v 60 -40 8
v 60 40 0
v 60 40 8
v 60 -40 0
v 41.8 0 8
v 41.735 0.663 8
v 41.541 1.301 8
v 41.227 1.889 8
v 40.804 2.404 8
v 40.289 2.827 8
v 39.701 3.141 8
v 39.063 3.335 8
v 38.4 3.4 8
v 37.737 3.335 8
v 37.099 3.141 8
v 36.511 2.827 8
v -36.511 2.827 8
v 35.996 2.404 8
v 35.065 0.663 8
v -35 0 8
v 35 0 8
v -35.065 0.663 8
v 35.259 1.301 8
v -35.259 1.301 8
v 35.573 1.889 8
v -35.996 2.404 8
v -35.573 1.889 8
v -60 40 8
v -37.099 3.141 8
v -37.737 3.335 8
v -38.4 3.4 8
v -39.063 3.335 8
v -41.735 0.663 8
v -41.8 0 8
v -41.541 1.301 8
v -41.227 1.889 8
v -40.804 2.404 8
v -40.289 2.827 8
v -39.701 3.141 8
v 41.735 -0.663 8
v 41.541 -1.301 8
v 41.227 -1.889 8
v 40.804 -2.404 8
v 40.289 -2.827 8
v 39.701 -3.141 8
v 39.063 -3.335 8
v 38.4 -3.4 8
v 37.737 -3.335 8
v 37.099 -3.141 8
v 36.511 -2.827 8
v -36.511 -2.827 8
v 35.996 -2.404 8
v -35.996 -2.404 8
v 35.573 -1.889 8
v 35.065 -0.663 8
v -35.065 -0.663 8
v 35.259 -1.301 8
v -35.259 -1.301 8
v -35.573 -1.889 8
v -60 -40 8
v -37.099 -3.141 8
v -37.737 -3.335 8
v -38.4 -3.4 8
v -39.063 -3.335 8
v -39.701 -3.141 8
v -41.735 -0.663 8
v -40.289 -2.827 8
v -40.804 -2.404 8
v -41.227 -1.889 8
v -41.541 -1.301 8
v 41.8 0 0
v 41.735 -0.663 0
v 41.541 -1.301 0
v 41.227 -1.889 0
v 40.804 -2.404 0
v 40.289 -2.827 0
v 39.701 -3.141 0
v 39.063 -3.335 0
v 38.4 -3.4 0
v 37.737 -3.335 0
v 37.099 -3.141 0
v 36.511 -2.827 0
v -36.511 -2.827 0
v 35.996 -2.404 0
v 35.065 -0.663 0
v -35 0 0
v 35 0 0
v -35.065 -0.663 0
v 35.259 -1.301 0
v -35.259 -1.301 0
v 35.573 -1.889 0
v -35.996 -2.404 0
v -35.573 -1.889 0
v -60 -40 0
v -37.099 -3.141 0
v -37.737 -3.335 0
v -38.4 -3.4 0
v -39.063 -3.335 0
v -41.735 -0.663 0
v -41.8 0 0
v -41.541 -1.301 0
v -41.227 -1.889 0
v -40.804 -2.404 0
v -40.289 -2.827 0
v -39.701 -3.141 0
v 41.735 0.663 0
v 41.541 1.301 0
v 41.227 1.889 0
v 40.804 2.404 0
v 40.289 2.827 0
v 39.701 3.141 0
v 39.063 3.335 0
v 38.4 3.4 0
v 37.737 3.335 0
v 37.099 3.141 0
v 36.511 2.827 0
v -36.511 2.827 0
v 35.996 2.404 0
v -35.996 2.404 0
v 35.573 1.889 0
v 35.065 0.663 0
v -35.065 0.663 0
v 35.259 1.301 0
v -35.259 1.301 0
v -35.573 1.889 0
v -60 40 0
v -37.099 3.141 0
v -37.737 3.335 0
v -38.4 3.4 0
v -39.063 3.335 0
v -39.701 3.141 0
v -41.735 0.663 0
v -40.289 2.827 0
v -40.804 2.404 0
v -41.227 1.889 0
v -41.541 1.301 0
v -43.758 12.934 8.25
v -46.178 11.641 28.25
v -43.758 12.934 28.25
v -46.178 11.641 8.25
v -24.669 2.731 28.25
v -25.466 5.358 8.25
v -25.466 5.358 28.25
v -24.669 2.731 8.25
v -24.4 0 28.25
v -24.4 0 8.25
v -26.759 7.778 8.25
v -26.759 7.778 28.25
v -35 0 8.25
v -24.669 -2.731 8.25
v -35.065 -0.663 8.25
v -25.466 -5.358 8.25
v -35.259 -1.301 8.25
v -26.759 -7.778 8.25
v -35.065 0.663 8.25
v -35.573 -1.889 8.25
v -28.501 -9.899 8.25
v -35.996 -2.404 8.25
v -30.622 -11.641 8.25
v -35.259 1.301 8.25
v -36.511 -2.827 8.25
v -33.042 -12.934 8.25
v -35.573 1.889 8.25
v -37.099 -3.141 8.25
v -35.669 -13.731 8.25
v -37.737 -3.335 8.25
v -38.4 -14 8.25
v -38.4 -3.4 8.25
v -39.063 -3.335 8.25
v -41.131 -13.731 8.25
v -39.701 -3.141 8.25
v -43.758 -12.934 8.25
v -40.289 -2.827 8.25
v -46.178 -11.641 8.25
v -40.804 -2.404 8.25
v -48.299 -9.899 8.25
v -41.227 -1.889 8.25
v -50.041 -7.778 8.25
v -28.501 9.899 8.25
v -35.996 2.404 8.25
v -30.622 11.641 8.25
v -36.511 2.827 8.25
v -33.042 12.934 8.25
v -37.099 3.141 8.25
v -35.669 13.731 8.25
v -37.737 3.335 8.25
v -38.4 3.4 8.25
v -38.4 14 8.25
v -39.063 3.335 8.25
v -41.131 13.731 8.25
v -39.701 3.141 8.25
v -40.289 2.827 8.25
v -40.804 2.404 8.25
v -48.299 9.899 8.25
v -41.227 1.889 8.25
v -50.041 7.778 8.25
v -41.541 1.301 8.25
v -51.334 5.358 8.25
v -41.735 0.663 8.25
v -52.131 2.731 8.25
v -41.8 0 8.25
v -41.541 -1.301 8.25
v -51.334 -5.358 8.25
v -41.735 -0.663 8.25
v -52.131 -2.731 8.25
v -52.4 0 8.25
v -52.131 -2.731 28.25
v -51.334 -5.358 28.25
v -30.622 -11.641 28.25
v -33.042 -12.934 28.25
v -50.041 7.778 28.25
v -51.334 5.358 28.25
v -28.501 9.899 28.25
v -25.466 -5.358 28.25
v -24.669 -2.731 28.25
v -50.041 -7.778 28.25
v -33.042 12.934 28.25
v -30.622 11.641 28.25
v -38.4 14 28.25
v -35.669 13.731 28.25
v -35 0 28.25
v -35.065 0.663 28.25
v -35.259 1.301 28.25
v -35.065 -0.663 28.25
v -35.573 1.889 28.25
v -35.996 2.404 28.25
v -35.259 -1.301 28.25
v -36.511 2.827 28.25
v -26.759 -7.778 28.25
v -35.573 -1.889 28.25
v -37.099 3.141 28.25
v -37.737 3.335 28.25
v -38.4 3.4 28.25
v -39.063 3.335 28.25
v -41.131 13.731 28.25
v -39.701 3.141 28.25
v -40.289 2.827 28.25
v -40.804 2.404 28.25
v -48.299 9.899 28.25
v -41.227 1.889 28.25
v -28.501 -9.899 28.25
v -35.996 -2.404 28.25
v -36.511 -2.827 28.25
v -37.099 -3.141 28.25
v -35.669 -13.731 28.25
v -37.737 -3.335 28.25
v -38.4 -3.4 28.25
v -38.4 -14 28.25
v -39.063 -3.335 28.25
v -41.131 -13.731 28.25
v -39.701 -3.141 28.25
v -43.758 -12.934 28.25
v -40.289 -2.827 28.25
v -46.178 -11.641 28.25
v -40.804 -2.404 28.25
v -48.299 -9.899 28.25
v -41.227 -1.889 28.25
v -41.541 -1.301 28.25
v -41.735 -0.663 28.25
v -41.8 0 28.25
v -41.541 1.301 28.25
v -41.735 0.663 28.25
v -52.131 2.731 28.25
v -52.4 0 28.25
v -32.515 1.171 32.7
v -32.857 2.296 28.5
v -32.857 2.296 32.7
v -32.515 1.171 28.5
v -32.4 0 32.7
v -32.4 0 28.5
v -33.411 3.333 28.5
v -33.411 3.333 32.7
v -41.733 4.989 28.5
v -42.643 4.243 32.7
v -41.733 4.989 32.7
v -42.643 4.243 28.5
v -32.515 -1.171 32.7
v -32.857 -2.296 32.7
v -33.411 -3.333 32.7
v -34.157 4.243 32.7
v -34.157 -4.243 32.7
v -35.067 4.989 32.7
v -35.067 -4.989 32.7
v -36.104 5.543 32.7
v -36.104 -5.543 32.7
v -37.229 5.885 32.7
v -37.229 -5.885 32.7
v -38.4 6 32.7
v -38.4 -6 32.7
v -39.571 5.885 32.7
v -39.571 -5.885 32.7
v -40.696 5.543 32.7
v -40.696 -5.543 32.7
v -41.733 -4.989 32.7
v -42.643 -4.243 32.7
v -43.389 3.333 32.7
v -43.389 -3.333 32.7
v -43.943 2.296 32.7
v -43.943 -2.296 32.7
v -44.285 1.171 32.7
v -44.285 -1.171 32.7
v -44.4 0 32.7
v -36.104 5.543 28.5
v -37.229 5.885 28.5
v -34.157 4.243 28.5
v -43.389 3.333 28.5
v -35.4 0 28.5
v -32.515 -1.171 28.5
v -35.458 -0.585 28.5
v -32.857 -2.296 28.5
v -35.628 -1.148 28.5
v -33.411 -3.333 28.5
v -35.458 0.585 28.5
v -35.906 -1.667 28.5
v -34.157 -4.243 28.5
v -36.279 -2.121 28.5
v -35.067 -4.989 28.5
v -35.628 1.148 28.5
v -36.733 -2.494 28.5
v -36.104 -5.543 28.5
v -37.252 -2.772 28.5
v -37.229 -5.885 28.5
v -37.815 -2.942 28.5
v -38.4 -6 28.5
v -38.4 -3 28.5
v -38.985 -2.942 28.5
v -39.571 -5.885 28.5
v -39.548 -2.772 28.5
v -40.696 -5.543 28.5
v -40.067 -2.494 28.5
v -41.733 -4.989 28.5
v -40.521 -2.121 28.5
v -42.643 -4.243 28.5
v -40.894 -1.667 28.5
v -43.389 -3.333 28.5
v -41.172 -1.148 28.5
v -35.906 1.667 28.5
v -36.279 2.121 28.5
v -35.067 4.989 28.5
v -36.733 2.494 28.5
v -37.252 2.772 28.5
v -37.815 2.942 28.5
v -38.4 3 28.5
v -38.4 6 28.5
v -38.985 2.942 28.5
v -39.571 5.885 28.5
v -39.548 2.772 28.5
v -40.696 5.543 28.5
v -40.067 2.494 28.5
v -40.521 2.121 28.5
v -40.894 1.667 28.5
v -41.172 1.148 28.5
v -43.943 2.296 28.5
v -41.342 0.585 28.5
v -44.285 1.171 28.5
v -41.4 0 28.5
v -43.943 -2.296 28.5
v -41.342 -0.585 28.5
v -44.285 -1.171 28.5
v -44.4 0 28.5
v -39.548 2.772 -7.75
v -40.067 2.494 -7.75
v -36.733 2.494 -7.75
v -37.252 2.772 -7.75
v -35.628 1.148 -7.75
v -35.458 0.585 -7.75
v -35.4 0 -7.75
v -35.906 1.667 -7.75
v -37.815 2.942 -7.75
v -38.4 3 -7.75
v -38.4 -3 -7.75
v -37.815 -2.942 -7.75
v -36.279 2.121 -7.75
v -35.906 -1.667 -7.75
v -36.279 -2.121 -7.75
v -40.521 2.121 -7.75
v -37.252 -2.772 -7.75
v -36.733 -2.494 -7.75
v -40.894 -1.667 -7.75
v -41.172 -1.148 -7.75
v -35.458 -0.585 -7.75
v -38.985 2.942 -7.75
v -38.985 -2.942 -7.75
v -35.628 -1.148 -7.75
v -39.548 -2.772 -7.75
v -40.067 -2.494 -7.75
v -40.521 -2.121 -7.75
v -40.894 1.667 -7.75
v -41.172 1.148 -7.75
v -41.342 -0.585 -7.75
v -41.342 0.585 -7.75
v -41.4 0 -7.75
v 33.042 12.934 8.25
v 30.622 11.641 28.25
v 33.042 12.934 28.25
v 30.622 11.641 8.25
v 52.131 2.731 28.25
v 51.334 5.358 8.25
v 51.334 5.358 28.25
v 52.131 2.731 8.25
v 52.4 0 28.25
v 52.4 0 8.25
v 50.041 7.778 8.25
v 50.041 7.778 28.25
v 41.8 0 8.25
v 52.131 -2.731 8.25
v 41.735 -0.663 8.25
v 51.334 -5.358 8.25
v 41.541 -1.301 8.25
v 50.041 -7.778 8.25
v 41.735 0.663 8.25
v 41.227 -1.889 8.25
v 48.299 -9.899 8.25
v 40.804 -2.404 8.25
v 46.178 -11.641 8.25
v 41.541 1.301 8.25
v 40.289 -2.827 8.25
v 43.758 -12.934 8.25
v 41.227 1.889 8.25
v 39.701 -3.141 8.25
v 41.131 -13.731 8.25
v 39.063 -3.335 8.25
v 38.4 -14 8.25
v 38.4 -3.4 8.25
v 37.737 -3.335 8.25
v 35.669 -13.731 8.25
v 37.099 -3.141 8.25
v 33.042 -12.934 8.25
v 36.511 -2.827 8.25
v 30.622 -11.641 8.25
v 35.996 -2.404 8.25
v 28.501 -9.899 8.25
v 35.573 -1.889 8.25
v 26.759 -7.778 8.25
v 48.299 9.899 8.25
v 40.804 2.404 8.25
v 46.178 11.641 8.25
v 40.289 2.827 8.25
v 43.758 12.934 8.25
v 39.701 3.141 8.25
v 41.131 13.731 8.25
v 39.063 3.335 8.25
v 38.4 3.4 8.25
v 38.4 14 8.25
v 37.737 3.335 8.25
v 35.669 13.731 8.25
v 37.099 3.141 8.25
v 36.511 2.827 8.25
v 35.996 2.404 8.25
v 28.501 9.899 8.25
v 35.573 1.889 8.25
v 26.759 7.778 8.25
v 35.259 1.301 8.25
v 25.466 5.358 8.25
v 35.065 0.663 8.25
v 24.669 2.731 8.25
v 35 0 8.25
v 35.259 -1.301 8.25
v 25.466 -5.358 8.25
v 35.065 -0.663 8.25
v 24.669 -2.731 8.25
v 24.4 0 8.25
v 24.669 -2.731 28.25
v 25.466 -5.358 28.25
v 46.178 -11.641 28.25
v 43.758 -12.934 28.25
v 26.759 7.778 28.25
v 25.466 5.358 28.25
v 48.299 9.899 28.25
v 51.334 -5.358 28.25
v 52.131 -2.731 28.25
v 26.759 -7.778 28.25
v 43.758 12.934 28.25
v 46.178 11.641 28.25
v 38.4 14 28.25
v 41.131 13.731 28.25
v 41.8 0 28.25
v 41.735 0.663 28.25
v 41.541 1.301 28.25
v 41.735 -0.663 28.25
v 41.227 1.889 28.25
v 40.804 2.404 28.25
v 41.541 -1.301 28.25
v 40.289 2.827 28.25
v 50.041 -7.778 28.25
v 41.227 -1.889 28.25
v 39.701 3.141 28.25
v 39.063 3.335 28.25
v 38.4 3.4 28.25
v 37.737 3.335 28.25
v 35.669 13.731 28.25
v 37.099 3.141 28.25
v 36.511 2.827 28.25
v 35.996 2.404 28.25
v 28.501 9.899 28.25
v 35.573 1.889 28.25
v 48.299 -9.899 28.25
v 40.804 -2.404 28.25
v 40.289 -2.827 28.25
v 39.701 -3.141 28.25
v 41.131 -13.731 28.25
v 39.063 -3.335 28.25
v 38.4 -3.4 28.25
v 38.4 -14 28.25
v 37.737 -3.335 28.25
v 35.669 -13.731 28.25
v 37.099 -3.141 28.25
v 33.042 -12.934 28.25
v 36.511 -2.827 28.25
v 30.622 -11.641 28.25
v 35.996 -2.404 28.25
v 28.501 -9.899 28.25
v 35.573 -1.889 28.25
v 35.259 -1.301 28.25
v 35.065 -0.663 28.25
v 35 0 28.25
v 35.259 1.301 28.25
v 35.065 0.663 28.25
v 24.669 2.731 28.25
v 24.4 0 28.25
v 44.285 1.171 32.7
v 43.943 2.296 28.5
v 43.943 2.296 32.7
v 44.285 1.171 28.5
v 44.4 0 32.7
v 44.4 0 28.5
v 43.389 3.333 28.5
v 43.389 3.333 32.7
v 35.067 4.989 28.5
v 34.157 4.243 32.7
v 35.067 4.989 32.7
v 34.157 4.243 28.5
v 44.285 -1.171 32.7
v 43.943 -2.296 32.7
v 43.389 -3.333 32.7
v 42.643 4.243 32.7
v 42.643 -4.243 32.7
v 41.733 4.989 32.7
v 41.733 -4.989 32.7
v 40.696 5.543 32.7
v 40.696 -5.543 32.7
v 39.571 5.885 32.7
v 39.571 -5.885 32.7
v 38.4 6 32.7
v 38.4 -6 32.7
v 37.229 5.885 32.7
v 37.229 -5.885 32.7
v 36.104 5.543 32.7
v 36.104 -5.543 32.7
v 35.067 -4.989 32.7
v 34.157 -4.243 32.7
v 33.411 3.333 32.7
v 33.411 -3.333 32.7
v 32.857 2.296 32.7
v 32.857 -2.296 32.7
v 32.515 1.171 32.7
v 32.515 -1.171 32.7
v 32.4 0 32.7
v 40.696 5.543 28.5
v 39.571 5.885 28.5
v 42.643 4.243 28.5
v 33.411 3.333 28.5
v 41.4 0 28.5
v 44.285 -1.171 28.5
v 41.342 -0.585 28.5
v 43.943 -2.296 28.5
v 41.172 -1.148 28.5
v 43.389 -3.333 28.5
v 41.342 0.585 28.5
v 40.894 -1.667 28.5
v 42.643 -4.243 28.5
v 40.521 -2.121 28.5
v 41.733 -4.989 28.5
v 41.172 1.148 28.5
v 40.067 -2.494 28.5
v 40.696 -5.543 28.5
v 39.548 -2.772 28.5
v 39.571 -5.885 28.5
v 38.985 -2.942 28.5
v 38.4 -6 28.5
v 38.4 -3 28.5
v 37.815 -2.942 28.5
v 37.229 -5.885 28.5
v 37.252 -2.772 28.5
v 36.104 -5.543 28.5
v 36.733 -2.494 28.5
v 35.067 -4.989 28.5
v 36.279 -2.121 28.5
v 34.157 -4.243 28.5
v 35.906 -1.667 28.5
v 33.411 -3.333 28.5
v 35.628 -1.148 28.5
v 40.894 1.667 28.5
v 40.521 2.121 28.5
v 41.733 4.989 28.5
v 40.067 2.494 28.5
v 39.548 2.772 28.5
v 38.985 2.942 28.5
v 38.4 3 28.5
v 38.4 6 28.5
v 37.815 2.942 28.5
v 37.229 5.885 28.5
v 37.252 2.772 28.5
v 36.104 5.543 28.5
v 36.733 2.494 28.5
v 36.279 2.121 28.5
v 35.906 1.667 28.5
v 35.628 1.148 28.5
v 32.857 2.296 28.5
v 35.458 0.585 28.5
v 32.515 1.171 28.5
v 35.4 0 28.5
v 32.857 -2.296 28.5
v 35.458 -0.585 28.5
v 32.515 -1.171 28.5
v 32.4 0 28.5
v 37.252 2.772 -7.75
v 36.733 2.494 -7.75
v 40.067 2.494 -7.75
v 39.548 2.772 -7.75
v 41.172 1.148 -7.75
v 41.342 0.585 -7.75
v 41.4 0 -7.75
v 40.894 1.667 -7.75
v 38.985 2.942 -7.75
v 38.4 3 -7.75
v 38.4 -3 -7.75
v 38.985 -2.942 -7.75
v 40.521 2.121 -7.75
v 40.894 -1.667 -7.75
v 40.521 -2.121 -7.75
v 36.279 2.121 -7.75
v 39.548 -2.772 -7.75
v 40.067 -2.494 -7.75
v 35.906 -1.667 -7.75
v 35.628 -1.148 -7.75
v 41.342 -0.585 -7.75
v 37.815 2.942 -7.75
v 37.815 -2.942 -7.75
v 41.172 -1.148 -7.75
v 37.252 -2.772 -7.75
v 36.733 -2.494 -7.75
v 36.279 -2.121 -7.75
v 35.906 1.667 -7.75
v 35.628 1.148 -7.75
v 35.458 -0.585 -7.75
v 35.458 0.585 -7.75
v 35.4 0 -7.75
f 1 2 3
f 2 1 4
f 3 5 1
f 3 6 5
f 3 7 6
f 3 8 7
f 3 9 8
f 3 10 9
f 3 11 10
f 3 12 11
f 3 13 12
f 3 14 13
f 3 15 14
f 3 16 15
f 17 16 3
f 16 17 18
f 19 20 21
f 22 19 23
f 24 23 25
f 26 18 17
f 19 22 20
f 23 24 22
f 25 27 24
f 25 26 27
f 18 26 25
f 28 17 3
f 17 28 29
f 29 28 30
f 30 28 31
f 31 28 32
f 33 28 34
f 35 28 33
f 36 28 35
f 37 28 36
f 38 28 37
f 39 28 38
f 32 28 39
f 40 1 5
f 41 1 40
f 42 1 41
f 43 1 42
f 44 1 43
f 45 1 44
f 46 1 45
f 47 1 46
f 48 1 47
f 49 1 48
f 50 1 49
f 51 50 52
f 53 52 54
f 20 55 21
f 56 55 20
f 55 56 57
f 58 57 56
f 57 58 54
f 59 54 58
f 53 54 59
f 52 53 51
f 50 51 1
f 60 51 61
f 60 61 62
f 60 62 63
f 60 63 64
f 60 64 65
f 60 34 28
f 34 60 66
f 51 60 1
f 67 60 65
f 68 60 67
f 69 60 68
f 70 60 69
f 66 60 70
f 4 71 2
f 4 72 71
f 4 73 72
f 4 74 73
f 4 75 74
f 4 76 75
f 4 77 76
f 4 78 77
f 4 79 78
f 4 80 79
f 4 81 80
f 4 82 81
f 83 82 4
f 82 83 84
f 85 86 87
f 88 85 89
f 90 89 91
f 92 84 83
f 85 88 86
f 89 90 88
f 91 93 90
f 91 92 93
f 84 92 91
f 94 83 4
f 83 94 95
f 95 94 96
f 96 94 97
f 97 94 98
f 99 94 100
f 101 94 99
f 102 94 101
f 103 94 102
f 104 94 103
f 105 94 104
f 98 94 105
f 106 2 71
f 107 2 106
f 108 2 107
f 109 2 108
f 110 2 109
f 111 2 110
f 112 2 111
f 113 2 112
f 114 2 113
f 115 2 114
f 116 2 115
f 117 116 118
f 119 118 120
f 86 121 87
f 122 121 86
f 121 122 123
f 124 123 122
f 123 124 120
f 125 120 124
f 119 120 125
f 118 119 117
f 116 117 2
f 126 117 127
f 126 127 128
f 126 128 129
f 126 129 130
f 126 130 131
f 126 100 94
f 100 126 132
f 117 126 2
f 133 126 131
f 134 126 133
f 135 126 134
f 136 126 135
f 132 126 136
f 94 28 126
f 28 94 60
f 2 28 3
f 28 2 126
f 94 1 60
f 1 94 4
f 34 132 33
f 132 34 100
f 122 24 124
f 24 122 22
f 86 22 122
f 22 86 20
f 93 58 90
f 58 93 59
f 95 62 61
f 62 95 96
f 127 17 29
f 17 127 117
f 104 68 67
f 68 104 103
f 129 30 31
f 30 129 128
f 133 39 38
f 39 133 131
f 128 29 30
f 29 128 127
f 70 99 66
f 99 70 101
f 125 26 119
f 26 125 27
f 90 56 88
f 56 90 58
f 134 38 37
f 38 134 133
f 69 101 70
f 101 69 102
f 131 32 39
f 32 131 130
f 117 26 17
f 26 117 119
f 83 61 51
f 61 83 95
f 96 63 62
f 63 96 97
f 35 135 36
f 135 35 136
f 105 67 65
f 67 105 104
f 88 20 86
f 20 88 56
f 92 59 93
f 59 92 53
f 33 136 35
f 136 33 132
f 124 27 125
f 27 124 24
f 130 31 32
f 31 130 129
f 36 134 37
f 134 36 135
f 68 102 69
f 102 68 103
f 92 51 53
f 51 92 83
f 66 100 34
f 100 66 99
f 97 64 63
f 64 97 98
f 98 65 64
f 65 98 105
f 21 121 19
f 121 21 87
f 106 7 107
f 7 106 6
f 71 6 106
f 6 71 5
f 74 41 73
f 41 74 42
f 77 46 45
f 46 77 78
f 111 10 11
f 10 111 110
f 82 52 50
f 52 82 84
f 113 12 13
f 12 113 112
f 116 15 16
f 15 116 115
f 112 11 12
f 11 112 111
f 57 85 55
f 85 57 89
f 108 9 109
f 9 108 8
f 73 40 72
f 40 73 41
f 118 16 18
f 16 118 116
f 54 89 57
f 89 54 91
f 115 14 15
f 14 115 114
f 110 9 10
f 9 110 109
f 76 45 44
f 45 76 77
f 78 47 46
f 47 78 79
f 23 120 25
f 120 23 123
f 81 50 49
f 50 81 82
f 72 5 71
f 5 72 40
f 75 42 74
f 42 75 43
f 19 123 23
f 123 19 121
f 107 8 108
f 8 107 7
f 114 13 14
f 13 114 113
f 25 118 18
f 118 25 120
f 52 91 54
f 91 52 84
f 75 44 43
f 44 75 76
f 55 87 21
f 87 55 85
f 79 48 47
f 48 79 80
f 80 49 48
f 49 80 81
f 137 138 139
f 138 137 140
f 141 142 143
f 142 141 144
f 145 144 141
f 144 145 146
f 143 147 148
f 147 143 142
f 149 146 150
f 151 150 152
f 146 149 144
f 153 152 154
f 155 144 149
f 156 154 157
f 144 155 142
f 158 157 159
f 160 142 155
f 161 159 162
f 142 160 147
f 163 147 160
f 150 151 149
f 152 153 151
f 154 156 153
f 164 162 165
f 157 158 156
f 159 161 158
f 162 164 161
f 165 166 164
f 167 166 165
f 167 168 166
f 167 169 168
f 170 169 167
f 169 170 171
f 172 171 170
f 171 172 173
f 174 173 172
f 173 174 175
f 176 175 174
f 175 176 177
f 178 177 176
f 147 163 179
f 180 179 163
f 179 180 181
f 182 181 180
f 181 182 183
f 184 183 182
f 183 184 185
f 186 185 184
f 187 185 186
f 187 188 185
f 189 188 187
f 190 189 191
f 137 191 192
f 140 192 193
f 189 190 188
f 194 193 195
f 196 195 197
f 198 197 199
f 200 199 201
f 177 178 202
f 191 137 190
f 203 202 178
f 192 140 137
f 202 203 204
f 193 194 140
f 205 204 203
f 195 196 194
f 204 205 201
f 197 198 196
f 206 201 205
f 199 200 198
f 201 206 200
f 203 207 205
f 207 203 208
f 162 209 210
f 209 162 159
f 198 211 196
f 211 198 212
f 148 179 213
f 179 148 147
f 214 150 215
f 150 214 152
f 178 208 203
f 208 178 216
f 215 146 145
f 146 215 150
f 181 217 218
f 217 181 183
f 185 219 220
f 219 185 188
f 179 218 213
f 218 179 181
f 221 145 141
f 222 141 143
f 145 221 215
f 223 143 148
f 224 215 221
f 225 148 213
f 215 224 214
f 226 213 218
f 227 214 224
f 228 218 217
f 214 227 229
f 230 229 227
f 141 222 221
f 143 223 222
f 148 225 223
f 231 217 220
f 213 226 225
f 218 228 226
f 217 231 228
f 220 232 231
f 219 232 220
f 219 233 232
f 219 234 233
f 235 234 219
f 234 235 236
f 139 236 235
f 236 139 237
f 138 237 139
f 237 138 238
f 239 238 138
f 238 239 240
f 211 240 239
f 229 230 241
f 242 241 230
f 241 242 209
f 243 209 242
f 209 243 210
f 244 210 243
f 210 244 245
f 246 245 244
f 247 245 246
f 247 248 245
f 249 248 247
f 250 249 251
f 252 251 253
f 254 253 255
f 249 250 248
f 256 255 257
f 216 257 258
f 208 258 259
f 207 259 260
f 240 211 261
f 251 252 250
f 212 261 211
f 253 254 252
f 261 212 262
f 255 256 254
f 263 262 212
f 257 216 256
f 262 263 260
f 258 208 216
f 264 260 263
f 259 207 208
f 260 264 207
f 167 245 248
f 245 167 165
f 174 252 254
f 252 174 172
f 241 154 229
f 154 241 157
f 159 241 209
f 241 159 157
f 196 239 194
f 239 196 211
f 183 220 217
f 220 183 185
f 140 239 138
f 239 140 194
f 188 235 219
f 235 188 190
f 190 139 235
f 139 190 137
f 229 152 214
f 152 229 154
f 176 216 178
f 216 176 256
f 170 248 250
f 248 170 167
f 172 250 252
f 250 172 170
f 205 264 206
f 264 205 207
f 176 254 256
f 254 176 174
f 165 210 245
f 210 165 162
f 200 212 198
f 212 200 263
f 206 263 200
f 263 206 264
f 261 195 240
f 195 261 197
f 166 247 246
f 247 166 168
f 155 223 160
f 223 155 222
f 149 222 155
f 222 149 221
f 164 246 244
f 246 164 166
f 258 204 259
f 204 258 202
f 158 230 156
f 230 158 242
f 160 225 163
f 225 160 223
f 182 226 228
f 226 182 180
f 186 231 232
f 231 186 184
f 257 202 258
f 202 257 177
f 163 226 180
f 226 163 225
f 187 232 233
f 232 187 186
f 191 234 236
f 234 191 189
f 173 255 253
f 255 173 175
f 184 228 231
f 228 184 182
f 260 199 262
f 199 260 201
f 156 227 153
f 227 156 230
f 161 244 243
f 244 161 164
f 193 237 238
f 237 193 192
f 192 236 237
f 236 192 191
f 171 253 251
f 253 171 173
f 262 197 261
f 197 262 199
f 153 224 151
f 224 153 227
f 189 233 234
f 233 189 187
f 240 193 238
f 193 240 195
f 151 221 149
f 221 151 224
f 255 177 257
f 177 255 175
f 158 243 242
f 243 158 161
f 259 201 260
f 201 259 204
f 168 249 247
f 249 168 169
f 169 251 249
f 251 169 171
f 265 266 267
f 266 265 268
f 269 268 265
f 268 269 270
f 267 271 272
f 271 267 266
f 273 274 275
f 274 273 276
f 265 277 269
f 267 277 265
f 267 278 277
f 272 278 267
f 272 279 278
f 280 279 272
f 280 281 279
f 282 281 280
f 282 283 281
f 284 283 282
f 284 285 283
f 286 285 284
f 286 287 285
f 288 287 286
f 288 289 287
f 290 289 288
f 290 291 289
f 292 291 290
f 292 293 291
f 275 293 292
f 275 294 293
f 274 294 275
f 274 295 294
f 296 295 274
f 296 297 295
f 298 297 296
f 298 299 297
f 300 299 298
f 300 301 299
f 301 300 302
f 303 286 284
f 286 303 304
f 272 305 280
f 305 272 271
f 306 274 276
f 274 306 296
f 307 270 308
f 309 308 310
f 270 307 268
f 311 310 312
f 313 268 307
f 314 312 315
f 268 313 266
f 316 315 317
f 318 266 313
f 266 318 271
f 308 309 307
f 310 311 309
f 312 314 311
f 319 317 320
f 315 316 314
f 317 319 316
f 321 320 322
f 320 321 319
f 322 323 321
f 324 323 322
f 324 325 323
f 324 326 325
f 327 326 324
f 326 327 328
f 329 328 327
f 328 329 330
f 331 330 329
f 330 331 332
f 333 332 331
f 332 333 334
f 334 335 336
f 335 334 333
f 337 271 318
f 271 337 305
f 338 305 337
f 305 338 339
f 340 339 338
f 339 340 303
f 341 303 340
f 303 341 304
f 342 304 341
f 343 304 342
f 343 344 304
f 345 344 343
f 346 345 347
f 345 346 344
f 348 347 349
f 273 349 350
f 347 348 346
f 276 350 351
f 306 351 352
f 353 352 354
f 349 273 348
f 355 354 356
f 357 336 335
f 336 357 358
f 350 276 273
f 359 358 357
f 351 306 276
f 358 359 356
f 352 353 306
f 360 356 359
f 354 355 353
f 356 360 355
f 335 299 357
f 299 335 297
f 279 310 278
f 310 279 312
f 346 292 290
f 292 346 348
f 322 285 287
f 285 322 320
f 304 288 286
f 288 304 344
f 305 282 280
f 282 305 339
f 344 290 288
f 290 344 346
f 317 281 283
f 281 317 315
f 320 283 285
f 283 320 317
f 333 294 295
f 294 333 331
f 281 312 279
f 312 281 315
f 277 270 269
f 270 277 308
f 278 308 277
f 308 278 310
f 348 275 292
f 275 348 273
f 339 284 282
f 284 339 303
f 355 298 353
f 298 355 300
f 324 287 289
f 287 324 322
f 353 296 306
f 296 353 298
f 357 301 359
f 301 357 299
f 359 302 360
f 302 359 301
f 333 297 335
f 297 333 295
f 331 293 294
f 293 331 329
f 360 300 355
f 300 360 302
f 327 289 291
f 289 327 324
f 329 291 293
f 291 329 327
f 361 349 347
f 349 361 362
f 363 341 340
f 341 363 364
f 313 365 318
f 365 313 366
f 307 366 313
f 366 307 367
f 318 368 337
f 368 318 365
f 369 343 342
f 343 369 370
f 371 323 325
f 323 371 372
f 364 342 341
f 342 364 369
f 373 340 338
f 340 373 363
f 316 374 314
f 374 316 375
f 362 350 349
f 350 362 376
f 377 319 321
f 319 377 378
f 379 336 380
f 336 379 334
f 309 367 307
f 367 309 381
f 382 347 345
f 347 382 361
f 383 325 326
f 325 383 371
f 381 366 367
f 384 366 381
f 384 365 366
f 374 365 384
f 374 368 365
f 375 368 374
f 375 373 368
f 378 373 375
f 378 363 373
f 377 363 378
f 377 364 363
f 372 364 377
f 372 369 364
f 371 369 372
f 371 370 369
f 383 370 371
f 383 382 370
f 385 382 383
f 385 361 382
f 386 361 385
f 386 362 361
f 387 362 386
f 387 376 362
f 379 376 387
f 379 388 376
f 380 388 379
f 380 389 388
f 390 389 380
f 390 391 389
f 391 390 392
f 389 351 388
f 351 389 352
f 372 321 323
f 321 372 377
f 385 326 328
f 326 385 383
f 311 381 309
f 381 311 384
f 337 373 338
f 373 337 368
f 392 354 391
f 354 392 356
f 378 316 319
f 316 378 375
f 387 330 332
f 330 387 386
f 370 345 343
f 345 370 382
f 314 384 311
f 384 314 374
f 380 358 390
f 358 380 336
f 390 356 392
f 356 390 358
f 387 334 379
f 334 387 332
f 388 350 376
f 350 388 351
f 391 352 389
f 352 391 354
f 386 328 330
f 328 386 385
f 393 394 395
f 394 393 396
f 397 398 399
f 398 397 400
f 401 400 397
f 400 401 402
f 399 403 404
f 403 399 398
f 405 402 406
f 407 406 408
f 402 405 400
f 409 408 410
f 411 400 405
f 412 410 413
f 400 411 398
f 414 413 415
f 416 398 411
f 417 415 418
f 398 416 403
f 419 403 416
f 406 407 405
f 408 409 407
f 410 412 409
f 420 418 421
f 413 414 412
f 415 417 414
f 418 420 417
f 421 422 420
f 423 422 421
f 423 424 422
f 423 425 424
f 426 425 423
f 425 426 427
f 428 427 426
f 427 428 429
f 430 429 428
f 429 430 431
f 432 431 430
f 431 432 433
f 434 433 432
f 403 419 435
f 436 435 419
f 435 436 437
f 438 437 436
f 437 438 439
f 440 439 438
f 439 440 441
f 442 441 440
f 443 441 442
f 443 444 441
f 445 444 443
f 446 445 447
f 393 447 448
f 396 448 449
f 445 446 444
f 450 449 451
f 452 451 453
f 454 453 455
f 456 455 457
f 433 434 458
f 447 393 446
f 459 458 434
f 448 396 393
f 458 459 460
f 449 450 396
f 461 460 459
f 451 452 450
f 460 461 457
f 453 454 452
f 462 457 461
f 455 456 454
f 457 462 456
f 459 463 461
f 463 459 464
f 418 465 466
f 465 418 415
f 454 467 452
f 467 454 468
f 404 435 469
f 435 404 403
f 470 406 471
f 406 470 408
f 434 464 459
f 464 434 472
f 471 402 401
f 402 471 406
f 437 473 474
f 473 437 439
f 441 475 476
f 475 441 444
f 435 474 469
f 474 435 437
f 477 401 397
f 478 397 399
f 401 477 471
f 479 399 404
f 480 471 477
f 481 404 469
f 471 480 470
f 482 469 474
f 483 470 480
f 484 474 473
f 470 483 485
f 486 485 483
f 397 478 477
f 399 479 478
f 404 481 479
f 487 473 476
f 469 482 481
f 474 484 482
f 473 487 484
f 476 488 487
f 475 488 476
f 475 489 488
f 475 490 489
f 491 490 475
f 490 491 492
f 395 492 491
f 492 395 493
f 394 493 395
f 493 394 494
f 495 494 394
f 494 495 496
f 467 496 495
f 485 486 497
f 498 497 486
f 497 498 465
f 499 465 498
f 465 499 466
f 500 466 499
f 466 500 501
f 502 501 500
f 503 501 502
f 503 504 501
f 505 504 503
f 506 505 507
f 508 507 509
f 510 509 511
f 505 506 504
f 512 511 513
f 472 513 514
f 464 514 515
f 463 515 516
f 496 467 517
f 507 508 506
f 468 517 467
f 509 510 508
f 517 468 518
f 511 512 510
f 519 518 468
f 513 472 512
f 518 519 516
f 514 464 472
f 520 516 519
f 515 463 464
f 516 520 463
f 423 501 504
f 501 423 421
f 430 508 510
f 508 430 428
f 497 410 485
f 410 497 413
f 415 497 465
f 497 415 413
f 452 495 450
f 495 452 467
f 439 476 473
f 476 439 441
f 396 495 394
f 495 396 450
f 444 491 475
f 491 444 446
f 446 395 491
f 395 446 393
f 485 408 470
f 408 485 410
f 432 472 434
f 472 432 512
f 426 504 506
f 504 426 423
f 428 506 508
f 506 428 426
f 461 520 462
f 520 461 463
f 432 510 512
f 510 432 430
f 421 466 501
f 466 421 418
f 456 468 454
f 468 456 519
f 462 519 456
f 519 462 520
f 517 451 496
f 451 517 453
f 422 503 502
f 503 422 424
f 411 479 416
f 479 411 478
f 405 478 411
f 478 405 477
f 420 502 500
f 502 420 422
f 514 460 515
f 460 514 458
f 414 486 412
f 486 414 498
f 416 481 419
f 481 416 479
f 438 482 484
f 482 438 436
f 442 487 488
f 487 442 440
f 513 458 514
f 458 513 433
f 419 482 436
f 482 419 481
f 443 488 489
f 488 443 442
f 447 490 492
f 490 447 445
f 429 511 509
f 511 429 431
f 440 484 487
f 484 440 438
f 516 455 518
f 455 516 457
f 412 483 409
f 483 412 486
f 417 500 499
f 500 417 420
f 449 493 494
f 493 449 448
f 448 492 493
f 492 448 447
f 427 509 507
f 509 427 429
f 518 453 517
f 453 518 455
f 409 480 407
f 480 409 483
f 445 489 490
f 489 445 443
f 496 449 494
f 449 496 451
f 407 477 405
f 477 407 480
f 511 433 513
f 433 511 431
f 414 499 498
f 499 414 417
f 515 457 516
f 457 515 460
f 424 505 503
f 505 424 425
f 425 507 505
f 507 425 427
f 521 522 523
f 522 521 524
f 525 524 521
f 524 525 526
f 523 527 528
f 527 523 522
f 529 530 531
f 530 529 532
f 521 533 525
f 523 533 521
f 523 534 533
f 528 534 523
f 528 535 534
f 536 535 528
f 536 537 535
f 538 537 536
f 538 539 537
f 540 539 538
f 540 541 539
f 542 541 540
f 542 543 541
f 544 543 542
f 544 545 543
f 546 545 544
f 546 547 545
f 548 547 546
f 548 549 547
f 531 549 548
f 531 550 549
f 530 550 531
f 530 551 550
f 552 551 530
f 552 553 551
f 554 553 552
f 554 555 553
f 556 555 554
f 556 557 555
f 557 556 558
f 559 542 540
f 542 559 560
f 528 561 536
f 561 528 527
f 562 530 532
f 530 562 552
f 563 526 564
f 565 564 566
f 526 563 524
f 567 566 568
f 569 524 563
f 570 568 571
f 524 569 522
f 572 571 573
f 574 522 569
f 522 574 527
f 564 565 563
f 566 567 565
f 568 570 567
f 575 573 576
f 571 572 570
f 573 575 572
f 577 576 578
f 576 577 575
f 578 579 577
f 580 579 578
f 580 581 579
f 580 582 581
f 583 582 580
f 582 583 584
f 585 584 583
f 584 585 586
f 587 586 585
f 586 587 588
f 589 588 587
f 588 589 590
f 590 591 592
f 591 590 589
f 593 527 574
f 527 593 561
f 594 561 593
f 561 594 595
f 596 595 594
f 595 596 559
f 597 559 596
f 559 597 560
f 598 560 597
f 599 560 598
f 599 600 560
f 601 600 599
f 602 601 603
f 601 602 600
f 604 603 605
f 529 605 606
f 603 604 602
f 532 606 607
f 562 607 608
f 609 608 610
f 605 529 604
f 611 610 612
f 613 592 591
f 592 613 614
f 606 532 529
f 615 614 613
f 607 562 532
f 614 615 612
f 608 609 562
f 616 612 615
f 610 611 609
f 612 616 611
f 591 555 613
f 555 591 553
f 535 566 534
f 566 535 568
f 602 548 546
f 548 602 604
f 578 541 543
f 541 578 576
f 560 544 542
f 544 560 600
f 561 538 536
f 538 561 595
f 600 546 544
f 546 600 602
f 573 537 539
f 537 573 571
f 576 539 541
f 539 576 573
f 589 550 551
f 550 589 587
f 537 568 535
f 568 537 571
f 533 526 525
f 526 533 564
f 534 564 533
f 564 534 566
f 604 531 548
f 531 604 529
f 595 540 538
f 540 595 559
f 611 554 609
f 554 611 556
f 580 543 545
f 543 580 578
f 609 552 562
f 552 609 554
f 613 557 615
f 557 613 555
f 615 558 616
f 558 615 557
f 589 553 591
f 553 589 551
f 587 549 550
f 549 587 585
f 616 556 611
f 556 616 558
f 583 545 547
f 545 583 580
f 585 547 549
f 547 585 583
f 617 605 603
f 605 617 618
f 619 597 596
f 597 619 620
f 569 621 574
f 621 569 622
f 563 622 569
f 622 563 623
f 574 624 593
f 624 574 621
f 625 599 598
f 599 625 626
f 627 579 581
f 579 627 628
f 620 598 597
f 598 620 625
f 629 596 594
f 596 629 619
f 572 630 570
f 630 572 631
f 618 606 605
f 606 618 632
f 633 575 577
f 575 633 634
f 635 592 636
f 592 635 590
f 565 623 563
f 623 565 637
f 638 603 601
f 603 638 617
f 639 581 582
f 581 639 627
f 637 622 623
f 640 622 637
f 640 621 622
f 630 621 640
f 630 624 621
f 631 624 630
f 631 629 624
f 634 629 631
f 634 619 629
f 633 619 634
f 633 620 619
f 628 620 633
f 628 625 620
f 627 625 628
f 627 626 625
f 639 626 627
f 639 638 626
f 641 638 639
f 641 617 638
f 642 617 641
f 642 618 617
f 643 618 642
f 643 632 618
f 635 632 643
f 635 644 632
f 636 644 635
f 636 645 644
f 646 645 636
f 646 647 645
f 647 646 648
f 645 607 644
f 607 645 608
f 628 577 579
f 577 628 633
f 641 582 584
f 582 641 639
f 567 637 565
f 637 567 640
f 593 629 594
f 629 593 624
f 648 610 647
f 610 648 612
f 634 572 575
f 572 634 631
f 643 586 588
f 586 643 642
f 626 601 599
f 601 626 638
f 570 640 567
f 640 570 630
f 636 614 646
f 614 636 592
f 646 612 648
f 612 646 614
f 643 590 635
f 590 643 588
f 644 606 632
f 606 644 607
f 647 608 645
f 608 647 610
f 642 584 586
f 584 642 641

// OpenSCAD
$fn = 32;

// ------------------------------------------------------------------------
// Standoff columns: 2 d28 standoffs, bolts d6
// Every part is its own module, assembly() places them once.
// ------------------------------------------------------------------------

// --- part 1 ---
module base_plate() {
  difference() {
    translate([-60, -40, 0]) cube([120, 80, 8]);
    translate([-38.4, 0, -1]) cylinder(h = 10, d = 6.8);
    translate([38.4, 0, -1]) cylinder(h = 10, d = 6.8);
  }
}

// --- part 2 ---
module spacer1() {
  difference() {
      translate([0, 0, 0]) cylinder(h = 20, d = 28);
      translate([0, 0, -1]) cylinder(h = 22, d = 6.8);
    }
}

// --- part 3 ---
module bolt1() {
  cylinder(h = 4.2, d = 12);
  translate([0, 0, -36.25]) cylinder(h = 36.25, d = 6);
}

// --- part 4 ---
module spacer2() {
  difference() {
      translate([0, 0, 0]) cylinder(h = 20, d = 28);
      translate([0, 0, -1]) cylinder(h = 22, d = 6.8);
    }
}

// --- part 5 ---
module bolt2() {
  cylinder(h = 4.2, d = 12);
  translate([0, 0, -36.25]) cylinder(h = 36.25, d = 6);
}

// --- assembly ---
module assembly() {
  translate([0, 0, 0]) rotate([0, 0, 0]) base_plate();
  translate([-38.4, 0, 8.25]) rotate([0, 0, 0]) spacer1();
  translate([-38.4, 0, 28.5]) rotate([0, 0, 0]) bolt1();
  translate([38.4, 0, 8.25]) rotate([0, 0, 0]) spacer2();
  translate([38.4, 0, 28.5]) rotate([0, 0, 0]) bolt2();
}

assembly();
